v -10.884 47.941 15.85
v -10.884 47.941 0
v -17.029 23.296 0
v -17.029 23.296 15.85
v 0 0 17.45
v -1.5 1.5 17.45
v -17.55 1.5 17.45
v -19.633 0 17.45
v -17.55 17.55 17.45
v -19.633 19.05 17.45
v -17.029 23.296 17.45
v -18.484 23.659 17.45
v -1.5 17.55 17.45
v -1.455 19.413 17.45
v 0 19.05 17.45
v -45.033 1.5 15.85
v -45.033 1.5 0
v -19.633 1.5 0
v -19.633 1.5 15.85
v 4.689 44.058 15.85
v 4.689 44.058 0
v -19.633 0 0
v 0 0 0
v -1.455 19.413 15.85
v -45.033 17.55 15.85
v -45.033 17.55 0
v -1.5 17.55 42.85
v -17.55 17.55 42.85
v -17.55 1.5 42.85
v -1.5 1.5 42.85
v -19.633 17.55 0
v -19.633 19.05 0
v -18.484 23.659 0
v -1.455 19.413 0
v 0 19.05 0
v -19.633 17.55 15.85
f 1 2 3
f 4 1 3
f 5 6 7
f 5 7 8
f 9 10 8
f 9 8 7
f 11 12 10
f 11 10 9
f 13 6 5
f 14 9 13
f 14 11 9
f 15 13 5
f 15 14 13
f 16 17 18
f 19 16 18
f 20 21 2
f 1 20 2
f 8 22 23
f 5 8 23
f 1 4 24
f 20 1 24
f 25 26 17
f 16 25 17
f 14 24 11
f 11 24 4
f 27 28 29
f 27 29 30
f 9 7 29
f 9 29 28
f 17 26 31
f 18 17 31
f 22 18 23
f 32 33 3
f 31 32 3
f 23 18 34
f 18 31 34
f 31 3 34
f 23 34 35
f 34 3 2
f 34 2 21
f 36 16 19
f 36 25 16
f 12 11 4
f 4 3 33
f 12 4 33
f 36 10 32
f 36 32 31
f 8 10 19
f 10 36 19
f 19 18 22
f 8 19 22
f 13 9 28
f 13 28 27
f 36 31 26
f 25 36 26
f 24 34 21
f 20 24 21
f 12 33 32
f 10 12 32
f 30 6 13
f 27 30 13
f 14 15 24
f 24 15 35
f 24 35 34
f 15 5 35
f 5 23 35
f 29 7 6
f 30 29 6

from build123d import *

# Parameters (mm, degrees)
F1_DEPTH = 15.85
F3_DEPTH = 1.6
F4_W     = 16.05
F4_H     = 16.05
F5_DEPTH = 25.4


with BuildPart() as f1:
    # F0 (on Top) → F1 (new body)
    with BuildSketch(Plane.XY):
        Polygon((-19.63319, 0), (0, 0), (0, 19.05), (-1.455444, 19.412883), (4.689373, 44.058394), (-10.883874, 47.941241), (-17.02869, 23.295729), (-18.484134, 23.658612), (-19.63319, 19.05), (-19.63319, 17.55), (-45.03319, 17.55), (-45.03319, 1.5), (-19.63319, 1.5), align=None)
    extrude(amount=F1_DEPTH)

    # F2 (on face) → F3 (join)
    with BuildSketch(Plane.XY.offset(15.85)):
        Polygon((-19.63319, 1.5), (-19.63319, 0), (0, 0), (0, 19.05), (-1.455444, 19.412883), (-17.02869, 23.295729), (-18.484134, 23.658612), (-19.63319, 19.05), (-19.63319, 17.55), align=None)
    extrude(amount=F3_DEPTH)

    # F4 (on face) → F5 (join)
    with BuildSketch(Plane.XY.offset(17.45)):
        with Locations((-9.525, 9.525)):
            Rectangle(F4_W, F4_H)
    extrude(amount=F5_DEPTH)


solid = f1.part
